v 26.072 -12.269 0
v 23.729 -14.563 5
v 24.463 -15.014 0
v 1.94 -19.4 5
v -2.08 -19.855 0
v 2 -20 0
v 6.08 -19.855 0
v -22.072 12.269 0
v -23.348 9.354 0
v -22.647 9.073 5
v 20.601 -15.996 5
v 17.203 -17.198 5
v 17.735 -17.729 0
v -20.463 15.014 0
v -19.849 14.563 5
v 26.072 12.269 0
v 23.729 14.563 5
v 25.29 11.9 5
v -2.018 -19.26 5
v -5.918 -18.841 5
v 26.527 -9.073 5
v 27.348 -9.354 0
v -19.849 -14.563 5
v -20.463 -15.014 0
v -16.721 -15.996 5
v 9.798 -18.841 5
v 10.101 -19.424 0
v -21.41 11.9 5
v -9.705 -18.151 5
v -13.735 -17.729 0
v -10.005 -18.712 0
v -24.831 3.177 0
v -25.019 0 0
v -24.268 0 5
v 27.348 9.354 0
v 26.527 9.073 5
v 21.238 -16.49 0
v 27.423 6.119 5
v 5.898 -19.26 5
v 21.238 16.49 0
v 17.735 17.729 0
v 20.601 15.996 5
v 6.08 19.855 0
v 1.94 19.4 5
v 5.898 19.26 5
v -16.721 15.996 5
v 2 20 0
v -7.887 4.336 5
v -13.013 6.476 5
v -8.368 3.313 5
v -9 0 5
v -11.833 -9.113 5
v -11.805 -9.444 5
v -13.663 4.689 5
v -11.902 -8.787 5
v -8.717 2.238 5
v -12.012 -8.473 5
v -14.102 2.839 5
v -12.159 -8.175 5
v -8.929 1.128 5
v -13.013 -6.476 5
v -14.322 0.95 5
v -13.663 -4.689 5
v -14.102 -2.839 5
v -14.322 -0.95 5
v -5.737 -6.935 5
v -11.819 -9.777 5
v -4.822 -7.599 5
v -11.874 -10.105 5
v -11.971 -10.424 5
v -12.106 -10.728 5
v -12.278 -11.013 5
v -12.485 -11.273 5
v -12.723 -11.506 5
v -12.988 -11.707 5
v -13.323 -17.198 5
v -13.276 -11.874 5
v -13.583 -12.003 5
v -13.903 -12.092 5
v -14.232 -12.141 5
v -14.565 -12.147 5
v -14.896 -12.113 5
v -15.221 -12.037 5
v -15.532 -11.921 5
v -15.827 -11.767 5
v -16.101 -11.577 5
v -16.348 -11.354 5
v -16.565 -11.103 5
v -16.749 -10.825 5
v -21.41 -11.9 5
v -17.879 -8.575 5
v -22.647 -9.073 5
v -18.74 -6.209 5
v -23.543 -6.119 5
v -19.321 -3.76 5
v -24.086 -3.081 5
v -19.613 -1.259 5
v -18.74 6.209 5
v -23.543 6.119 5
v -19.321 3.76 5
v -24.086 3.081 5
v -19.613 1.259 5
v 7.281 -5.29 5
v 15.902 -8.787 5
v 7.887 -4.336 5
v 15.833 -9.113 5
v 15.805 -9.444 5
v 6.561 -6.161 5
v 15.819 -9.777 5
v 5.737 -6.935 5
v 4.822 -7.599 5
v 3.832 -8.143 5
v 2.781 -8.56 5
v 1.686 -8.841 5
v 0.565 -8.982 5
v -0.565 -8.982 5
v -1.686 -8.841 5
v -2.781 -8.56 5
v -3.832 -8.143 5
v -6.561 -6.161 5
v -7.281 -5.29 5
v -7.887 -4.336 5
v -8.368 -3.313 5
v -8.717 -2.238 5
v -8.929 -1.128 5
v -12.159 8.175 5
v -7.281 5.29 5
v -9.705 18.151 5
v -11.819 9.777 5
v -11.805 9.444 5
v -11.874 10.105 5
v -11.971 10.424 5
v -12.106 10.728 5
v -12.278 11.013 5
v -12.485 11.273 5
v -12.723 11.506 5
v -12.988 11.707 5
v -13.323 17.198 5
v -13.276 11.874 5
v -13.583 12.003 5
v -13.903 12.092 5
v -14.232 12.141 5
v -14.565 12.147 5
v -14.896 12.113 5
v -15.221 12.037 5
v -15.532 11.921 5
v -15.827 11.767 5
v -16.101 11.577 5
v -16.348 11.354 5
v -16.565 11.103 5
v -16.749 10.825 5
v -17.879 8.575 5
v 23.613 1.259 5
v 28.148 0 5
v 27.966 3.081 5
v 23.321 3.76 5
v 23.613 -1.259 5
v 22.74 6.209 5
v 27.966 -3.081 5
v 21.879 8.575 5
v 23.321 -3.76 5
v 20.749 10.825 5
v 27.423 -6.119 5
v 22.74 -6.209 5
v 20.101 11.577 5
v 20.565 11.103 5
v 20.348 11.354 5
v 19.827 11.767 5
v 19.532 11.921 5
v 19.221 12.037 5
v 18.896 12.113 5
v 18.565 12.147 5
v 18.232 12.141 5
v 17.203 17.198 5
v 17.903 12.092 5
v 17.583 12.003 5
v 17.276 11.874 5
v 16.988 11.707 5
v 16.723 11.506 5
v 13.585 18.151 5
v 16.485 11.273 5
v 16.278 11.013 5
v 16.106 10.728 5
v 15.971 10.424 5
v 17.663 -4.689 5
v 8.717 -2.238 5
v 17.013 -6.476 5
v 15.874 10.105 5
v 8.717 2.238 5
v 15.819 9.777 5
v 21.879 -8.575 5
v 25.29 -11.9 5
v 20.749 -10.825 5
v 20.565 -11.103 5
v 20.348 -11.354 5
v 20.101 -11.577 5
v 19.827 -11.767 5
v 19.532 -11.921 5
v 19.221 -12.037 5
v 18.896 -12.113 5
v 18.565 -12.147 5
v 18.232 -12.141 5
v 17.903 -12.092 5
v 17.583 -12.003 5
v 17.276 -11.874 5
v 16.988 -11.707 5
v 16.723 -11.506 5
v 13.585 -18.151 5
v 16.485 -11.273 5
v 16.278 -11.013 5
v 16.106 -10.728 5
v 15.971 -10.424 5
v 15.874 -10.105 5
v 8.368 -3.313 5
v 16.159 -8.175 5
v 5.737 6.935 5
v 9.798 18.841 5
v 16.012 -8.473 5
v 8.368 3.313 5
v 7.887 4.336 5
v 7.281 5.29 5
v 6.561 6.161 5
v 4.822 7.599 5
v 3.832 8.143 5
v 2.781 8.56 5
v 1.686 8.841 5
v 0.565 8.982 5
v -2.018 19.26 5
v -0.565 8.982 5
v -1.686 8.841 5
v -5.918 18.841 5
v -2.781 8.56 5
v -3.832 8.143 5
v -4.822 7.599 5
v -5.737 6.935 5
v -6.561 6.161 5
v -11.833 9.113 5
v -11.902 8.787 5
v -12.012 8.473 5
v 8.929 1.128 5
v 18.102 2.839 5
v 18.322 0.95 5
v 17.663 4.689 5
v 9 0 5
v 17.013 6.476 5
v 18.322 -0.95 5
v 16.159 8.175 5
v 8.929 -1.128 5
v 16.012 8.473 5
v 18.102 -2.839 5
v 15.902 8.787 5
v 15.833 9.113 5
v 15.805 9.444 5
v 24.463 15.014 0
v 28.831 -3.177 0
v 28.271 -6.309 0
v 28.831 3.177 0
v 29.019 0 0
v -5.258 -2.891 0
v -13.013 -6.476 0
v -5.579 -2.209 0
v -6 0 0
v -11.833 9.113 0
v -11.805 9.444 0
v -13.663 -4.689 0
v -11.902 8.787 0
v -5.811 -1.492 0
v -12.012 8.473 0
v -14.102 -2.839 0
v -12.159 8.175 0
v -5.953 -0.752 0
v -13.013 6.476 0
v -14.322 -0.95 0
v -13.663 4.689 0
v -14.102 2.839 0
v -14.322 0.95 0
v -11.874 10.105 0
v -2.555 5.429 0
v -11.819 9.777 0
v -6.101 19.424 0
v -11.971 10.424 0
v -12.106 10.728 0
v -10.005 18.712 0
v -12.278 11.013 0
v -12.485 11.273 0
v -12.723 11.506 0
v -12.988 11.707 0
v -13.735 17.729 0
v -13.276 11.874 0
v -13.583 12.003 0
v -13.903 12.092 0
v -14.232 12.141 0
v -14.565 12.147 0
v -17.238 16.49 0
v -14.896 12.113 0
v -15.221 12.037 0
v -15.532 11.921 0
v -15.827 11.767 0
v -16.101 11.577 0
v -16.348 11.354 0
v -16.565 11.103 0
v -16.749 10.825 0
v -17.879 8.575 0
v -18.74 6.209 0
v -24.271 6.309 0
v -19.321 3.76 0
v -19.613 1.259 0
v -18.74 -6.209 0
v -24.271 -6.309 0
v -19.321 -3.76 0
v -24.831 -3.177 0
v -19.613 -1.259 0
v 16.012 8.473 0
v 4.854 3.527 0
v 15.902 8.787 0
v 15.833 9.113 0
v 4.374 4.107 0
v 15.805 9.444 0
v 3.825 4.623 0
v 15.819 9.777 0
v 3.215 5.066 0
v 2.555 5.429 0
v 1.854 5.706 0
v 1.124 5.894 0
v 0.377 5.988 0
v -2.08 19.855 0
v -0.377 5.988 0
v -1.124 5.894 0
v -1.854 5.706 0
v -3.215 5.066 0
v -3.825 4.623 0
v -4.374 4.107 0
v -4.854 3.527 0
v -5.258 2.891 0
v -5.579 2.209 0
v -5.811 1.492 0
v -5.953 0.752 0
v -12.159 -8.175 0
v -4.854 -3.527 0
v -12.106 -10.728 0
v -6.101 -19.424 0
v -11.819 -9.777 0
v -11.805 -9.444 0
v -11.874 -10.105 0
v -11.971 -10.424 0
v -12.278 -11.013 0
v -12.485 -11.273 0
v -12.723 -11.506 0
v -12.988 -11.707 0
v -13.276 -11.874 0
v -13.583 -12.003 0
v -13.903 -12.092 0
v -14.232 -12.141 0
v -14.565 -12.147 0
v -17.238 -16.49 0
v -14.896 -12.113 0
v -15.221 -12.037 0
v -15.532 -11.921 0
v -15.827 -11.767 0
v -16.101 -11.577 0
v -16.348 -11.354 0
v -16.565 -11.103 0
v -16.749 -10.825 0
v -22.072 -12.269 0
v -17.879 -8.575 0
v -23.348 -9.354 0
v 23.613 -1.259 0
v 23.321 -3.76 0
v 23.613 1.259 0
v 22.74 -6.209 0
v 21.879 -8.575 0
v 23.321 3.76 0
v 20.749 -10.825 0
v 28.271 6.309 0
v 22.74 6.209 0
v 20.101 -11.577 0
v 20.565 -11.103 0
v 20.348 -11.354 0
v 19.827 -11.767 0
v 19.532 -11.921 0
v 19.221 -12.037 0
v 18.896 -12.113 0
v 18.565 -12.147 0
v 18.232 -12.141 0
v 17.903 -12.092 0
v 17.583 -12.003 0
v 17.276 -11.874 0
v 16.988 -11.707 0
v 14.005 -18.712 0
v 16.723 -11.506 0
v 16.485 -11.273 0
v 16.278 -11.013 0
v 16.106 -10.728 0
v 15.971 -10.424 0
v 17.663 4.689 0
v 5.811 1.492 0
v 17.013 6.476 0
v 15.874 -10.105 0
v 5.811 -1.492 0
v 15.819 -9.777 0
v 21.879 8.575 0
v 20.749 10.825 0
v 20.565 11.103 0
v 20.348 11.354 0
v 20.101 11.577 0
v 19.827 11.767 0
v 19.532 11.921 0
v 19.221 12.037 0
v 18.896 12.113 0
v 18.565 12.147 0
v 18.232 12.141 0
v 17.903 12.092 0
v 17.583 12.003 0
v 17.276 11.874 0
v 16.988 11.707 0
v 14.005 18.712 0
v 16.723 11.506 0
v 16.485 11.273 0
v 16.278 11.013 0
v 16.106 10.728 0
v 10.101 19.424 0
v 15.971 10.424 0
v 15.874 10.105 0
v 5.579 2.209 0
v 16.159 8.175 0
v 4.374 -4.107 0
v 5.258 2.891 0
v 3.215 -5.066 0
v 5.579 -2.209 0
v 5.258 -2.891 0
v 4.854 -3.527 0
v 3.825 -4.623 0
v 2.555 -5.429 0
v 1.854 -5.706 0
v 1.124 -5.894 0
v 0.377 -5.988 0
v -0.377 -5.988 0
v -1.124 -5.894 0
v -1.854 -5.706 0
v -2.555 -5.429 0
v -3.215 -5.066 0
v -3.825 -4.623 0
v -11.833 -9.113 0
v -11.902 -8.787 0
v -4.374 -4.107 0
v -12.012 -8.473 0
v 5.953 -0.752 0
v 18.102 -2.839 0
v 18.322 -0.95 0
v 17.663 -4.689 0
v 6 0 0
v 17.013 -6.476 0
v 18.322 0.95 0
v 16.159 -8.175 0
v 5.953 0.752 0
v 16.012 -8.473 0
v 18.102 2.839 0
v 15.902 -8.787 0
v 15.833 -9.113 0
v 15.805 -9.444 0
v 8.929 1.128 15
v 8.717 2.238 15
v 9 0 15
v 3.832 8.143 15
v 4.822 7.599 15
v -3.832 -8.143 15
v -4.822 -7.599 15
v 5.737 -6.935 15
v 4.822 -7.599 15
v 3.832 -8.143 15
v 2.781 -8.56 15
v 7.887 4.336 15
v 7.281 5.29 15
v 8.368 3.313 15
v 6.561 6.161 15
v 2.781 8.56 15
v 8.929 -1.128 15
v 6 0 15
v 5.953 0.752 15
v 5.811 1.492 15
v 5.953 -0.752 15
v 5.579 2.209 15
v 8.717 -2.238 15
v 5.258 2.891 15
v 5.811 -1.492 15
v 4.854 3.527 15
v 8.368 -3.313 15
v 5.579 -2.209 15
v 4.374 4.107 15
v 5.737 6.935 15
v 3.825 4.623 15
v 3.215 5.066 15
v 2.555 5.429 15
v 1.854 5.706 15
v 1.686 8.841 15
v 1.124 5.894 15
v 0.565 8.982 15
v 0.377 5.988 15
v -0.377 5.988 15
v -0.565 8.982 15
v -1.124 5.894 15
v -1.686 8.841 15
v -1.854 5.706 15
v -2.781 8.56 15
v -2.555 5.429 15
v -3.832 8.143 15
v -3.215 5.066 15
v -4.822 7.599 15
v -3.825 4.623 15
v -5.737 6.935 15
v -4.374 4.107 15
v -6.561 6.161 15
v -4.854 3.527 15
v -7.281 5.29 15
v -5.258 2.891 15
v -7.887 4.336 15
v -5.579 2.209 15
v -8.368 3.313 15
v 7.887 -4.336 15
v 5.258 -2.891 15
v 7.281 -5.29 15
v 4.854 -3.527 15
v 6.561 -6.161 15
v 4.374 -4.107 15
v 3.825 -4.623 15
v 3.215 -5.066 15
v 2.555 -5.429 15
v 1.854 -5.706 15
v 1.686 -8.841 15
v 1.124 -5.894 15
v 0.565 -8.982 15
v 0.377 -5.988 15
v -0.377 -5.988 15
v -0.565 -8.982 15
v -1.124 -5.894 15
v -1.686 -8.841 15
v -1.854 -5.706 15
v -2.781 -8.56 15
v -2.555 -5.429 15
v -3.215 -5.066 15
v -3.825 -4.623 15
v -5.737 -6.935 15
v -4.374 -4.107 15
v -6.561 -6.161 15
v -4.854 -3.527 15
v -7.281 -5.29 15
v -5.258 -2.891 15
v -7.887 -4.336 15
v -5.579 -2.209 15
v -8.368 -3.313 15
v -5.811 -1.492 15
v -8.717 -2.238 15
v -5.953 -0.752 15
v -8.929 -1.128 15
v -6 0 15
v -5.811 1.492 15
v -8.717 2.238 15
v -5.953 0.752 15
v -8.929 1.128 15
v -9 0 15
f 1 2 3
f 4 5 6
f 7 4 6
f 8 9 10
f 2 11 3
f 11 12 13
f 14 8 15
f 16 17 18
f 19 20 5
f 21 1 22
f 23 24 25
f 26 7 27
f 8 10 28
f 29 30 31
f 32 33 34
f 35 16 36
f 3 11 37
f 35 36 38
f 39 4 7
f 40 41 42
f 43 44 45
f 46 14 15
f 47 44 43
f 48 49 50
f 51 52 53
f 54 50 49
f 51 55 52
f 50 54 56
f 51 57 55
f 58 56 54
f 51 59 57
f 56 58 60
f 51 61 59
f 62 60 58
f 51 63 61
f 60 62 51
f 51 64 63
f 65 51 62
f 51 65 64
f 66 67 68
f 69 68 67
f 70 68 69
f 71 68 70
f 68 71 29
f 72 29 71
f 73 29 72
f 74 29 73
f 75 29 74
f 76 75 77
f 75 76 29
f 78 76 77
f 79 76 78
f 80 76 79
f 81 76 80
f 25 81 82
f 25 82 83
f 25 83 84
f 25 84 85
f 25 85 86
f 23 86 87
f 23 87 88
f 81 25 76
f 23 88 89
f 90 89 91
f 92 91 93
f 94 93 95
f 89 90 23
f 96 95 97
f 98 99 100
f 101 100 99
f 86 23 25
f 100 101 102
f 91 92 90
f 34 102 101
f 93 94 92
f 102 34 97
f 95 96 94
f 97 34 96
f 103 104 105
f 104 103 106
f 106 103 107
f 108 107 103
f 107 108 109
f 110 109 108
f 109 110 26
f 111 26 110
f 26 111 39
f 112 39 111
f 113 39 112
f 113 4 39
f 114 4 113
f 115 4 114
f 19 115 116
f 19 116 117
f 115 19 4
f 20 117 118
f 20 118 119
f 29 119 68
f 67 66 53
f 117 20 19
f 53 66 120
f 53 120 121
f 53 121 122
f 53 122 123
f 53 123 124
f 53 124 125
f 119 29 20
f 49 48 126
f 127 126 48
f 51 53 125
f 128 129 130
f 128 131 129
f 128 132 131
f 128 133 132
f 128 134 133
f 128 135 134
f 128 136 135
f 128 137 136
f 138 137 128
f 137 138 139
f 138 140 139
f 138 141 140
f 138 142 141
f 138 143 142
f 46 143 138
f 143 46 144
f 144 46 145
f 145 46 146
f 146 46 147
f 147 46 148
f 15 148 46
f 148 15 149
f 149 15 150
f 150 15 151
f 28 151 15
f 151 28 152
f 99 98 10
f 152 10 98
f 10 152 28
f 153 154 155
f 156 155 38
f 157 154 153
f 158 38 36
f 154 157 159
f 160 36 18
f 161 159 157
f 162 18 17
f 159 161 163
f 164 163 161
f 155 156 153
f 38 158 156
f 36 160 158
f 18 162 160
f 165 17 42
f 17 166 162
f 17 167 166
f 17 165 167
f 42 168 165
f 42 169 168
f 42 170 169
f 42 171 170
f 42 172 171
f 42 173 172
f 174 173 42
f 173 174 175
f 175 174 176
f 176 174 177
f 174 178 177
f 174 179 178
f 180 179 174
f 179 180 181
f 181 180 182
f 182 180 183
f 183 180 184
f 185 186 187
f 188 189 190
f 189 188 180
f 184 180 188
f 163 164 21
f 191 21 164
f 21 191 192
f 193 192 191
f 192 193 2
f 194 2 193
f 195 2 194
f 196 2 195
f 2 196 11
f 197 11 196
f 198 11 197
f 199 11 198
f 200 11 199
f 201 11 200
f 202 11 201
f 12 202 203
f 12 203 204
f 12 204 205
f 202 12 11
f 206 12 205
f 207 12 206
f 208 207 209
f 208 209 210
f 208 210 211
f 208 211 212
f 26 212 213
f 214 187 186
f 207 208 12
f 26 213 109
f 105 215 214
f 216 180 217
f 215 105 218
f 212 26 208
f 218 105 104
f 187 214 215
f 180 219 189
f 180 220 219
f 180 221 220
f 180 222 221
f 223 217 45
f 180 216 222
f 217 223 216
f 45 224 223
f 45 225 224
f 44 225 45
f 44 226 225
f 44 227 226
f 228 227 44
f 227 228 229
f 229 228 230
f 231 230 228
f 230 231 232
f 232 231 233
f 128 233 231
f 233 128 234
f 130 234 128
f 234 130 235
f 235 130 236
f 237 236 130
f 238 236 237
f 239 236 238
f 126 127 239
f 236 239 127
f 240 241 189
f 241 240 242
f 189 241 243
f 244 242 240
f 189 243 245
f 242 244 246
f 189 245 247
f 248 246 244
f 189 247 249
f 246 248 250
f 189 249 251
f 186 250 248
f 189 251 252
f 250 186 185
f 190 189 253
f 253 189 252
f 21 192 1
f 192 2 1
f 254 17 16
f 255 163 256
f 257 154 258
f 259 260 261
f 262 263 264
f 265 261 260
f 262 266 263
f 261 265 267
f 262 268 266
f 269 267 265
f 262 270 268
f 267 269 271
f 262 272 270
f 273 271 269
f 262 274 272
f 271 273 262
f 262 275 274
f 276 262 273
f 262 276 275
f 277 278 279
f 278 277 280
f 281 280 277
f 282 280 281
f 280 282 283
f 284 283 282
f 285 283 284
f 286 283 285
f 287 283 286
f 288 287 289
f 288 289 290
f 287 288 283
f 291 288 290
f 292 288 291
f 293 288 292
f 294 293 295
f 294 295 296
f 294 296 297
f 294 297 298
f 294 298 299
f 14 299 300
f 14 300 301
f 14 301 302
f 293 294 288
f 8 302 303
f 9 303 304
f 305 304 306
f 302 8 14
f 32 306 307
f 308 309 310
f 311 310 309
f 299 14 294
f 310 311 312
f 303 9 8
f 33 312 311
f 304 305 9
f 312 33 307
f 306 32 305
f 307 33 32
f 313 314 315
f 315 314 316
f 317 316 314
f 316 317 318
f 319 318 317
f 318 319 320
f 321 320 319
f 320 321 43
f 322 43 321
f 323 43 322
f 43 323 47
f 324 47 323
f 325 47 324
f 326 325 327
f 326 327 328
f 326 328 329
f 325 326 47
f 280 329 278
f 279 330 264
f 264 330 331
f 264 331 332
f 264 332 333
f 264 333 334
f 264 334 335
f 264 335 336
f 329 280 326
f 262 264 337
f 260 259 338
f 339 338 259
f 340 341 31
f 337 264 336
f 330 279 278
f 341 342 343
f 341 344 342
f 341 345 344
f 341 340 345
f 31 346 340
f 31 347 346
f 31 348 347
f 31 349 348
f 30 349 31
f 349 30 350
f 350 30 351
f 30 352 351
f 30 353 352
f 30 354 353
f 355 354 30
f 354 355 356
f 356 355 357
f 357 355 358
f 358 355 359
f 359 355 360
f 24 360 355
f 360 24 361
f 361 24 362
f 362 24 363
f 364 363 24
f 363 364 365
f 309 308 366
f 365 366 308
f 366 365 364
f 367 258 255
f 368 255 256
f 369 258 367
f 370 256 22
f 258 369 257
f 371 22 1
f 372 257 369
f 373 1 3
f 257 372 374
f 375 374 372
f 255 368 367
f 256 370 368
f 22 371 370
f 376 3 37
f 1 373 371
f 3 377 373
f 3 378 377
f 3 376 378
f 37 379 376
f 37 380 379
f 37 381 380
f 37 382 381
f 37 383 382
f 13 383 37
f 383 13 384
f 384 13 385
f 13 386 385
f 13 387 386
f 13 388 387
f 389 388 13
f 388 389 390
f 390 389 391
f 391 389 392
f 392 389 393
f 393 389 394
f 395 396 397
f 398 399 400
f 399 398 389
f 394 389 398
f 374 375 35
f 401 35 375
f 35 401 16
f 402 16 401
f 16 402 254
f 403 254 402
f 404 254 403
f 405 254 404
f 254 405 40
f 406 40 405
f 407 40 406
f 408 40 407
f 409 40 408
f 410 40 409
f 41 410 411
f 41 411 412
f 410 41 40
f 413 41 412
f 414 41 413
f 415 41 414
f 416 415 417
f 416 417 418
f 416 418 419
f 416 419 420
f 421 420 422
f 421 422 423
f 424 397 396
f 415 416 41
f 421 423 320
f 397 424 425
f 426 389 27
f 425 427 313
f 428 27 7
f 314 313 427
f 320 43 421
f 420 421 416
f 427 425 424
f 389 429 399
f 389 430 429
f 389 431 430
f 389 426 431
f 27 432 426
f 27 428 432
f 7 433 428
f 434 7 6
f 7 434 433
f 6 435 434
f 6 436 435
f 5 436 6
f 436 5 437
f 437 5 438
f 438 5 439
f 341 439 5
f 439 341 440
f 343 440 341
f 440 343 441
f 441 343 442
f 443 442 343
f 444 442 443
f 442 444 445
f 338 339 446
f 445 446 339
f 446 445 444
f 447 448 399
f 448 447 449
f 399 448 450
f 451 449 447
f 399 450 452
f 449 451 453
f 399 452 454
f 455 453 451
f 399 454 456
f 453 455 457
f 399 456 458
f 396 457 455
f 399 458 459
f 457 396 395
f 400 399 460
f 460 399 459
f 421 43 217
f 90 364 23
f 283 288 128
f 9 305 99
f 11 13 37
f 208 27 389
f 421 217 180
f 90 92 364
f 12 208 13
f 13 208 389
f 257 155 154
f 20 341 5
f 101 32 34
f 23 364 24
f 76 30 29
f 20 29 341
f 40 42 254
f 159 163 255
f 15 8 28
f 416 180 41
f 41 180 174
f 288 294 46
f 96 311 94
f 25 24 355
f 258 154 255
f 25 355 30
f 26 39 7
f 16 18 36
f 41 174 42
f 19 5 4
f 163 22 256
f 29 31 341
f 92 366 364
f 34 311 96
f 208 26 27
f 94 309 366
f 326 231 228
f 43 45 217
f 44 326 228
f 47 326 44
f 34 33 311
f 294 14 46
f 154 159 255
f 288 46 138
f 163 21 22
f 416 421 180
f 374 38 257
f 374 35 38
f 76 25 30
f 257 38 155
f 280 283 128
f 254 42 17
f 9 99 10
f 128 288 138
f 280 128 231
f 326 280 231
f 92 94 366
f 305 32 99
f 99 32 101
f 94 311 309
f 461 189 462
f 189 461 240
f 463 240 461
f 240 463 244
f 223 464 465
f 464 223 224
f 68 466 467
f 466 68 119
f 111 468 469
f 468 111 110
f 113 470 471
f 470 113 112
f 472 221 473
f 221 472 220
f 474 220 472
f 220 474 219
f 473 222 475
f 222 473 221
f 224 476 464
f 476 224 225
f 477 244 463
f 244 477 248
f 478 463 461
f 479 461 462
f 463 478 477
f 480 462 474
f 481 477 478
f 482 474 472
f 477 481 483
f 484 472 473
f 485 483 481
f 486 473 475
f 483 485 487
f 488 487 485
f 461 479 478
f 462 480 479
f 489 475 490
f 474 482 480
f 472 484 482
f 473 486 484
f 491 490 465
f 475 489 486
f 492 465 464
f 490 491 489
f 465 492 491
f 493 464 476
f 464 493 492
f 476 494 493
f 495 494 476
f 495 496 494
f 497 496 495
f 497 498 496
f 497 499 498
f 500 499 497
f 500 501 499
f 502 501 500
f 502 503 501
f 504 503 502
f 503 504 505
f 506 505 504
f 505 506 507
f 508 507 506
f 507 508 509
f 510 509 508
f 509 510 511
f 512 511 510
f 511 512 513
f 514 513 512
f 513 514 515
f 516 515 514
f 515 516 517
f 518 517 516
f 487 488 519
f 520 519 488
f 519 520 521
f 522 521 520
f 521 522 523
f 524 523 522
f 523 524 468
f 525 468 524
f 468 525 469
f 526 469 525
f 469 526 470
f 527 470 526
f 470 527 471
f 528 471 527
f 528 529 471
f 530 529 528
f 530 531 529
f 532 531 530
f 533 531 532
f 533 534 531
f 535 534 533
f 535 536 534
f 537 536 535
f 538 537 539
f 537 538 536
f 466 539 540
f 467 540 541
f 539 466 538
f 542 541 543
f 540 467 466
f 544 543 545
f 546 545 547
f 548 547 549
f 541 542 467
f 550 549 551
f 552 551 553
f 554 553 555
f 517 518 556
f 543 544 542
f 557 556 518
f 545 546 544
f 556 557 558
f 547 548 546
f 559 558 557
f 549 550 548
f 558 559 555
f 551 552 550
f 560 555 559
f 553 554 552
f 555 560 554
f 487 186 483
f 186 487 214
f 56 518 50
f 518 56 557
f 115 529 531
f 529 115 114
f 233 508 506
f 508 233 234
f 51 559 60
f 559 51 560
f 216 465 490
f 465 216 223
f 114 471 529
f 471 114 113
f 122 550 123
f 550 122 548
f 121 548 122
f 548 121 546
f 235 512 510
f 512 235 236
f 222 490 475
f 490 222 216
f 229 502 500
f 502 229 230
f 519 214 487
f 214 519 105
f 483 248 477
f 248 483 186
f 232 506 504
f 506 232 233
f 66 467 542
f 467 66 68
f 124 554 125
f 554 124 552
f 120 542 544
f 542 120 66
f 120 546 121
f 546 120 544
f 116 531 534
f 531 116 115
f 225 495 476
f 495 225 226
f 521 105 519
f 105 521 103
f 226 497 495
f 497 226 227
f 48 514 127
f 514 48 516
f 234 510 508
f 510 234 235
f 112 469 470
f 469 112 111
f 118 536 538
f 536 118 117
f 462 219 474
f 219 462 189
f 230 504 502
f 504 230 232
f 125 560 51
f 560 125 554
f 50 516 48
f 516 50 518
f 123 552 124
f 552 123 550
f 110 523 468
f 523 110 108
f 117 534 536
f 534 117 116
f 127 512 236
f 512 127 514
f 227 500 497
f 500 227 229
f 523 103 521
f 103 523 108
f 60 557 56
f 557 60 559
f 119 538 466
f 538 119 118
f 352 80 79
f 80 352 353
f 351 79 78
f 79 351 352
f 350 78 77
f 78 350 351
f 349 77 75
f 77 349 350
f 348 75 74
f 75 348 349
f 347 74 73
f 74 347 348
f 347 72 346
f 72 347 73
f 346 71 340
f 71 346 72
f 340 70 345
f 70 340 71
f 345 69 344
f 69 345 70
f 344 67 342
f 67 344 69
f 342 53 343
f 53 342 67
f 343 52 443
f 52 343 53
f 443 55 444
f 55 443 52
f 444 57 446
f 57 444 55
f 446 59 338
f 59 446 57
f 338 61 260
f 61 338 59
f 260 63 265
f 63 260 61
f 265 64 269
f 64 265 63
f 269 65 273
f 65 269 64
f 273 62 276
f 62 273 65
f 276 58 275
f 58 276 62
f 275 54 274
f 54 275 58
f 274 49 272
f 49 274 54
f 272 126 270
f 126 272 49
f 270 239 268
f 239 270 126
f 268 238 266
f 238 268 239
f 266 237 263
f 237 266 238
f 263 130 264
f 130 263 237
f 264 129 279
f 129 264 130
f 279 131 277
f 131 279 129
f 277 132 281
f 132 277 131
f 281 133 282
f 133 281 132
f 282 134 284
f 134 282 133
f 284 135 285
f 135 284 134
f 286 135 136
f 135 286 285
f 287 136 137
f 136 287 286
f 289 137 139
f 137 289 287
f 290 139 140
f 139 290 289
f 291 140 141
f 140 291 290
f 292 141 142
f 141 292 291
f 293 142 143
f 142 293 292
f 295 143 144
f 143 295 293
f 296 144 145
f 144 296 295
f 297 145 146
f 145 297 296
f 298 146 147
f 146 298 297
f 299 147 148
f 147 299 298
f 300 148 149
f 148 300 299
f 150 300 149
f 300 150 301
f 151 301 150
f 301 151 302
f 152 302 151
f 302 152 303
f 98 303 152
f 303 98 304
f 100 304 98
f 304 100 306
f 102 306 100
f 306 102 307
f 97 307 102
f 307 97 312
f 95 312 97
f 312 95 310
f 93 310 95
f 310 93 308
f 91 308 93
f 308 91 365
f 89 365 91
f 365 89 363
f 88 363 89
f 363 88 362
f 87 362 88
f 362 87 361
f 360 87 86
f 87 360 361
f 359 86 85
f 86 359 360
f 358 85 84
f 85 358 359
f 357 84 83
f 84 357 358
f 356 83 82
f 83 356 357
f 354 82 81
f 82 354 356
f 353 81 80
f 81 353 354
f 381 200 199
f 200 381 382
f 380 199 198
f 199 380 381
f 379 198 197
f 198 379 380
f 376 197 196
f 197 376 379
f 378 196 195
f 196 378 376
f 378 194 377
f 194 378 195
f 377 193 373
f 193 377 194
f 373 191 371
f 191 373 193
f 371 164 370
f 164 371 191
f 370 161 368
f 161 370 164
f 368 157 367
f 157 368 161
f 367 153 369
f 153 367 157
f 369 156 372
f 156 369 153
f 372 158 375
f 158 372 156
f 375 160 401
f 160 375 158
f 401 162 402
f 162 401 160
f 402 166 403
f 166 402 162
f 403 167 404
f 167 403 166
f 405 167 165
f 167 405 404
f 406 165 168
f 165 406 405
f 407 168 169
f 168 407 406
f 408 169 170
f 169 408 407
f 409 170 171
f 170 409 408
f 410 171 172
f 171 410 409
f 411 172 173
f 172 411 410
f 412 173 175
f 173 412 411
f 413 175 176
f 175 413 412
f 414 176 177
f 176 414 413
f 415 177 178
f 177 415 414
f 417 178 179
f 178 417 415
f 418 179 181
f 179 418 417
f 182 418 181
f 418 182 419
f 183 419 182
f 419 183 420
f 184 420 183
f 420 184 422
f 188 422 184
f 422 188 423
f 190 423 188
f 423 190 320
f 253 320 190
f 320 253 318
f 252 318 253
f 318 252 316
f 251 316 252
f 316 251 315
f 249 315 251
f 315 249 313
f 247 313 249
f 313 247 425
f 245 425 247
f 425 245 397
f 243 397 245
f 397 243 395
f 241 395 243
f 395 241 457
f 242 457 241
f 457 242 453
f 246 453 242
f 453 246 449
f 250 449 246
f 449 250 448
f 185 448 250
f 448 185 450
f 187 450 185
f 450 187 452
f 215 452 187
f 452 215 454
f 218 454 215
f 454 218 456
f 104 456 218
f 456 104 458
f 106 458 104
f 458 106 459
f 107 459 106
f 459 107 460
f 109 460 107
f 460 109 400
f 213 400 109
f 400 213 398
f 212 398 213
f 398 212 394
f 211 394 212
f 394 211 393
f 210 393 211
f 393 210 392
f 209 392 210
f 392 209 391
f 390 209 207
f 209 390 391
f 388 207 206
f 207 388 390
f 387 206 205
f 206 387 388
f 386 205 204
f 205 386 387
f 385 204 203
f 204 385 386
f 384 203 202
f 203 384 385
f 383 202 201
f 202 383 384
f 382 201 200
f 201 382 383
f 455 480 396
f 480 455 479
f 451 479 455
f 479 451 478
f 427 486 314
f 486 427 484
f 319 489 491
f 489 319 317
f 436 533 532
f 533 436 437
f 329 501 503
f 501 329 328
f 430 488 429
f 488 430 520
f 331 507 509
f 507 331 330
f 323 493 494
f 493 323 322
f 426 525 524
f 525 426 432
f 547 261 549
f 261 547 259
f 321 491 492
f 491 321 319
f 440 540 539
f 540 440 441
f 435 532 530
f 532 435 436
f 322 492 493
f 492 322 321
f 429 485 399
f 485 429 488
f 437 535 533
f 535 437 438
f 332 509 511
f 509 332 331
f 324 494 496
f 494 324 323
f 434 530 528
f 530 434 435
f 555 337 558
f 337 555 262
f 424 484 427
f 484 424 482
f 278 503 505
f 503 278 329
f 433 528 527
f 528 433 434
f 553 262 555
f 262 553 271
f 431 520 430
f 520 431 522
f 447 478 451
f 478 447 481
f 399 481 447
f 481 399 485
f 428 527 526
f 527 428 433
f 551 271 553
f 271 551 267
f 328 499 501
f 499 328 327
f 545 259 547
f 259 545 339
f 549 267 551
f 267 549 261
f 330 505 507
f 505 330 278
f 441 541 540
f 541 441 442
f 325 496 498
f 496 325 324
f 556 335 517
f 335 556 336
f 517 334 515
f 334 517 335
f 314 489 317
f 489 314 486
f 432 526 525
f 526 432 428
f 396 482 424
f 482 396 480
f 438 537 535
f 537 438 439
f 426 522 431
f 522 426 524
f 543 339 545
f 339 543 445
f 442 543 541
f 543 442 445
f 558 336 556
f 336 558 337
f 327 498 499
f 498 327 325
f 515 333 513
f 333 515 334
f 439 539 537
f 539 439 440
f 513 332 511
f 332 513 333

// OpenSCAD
/* =====================================================================================
 *
 *       Filename:  support_axe12.scad
 *
 *    Description:  eccentric support for Ø12 axes
 *                   
 *                  eccentric adjustment (rotation) for Y axe mounted on
 *                  20x20 type 5 profile
 * 
 *        Version:  1.0
 *        Created:  07 06 2016
 *       Revision:  none
 *       Compiler:  gcc
 *
 *         Author:  Sebastien Chassot (sinux), seba.ptl@sinux.net
 *
 * =====================================================================================
 */


axe_dia = 12;
ext_dia = 18;
length = 15;
support_depth = 5;


difference() {
    union(){
        linear_extrude(height=support_depth, scale = 0.97, $fn=50)
                            import("section_0.dxf");
        
        cylinder(d = ext_dia, h = length, $fn = 50);
    }
                            
    linear_extrude(height=support_depth*3, center =true, $fn=50)
                            import("section_1.dxf");        

    cylinder(d = axe_dia, h = length*2.5, center =true, $fn = 50);
}
